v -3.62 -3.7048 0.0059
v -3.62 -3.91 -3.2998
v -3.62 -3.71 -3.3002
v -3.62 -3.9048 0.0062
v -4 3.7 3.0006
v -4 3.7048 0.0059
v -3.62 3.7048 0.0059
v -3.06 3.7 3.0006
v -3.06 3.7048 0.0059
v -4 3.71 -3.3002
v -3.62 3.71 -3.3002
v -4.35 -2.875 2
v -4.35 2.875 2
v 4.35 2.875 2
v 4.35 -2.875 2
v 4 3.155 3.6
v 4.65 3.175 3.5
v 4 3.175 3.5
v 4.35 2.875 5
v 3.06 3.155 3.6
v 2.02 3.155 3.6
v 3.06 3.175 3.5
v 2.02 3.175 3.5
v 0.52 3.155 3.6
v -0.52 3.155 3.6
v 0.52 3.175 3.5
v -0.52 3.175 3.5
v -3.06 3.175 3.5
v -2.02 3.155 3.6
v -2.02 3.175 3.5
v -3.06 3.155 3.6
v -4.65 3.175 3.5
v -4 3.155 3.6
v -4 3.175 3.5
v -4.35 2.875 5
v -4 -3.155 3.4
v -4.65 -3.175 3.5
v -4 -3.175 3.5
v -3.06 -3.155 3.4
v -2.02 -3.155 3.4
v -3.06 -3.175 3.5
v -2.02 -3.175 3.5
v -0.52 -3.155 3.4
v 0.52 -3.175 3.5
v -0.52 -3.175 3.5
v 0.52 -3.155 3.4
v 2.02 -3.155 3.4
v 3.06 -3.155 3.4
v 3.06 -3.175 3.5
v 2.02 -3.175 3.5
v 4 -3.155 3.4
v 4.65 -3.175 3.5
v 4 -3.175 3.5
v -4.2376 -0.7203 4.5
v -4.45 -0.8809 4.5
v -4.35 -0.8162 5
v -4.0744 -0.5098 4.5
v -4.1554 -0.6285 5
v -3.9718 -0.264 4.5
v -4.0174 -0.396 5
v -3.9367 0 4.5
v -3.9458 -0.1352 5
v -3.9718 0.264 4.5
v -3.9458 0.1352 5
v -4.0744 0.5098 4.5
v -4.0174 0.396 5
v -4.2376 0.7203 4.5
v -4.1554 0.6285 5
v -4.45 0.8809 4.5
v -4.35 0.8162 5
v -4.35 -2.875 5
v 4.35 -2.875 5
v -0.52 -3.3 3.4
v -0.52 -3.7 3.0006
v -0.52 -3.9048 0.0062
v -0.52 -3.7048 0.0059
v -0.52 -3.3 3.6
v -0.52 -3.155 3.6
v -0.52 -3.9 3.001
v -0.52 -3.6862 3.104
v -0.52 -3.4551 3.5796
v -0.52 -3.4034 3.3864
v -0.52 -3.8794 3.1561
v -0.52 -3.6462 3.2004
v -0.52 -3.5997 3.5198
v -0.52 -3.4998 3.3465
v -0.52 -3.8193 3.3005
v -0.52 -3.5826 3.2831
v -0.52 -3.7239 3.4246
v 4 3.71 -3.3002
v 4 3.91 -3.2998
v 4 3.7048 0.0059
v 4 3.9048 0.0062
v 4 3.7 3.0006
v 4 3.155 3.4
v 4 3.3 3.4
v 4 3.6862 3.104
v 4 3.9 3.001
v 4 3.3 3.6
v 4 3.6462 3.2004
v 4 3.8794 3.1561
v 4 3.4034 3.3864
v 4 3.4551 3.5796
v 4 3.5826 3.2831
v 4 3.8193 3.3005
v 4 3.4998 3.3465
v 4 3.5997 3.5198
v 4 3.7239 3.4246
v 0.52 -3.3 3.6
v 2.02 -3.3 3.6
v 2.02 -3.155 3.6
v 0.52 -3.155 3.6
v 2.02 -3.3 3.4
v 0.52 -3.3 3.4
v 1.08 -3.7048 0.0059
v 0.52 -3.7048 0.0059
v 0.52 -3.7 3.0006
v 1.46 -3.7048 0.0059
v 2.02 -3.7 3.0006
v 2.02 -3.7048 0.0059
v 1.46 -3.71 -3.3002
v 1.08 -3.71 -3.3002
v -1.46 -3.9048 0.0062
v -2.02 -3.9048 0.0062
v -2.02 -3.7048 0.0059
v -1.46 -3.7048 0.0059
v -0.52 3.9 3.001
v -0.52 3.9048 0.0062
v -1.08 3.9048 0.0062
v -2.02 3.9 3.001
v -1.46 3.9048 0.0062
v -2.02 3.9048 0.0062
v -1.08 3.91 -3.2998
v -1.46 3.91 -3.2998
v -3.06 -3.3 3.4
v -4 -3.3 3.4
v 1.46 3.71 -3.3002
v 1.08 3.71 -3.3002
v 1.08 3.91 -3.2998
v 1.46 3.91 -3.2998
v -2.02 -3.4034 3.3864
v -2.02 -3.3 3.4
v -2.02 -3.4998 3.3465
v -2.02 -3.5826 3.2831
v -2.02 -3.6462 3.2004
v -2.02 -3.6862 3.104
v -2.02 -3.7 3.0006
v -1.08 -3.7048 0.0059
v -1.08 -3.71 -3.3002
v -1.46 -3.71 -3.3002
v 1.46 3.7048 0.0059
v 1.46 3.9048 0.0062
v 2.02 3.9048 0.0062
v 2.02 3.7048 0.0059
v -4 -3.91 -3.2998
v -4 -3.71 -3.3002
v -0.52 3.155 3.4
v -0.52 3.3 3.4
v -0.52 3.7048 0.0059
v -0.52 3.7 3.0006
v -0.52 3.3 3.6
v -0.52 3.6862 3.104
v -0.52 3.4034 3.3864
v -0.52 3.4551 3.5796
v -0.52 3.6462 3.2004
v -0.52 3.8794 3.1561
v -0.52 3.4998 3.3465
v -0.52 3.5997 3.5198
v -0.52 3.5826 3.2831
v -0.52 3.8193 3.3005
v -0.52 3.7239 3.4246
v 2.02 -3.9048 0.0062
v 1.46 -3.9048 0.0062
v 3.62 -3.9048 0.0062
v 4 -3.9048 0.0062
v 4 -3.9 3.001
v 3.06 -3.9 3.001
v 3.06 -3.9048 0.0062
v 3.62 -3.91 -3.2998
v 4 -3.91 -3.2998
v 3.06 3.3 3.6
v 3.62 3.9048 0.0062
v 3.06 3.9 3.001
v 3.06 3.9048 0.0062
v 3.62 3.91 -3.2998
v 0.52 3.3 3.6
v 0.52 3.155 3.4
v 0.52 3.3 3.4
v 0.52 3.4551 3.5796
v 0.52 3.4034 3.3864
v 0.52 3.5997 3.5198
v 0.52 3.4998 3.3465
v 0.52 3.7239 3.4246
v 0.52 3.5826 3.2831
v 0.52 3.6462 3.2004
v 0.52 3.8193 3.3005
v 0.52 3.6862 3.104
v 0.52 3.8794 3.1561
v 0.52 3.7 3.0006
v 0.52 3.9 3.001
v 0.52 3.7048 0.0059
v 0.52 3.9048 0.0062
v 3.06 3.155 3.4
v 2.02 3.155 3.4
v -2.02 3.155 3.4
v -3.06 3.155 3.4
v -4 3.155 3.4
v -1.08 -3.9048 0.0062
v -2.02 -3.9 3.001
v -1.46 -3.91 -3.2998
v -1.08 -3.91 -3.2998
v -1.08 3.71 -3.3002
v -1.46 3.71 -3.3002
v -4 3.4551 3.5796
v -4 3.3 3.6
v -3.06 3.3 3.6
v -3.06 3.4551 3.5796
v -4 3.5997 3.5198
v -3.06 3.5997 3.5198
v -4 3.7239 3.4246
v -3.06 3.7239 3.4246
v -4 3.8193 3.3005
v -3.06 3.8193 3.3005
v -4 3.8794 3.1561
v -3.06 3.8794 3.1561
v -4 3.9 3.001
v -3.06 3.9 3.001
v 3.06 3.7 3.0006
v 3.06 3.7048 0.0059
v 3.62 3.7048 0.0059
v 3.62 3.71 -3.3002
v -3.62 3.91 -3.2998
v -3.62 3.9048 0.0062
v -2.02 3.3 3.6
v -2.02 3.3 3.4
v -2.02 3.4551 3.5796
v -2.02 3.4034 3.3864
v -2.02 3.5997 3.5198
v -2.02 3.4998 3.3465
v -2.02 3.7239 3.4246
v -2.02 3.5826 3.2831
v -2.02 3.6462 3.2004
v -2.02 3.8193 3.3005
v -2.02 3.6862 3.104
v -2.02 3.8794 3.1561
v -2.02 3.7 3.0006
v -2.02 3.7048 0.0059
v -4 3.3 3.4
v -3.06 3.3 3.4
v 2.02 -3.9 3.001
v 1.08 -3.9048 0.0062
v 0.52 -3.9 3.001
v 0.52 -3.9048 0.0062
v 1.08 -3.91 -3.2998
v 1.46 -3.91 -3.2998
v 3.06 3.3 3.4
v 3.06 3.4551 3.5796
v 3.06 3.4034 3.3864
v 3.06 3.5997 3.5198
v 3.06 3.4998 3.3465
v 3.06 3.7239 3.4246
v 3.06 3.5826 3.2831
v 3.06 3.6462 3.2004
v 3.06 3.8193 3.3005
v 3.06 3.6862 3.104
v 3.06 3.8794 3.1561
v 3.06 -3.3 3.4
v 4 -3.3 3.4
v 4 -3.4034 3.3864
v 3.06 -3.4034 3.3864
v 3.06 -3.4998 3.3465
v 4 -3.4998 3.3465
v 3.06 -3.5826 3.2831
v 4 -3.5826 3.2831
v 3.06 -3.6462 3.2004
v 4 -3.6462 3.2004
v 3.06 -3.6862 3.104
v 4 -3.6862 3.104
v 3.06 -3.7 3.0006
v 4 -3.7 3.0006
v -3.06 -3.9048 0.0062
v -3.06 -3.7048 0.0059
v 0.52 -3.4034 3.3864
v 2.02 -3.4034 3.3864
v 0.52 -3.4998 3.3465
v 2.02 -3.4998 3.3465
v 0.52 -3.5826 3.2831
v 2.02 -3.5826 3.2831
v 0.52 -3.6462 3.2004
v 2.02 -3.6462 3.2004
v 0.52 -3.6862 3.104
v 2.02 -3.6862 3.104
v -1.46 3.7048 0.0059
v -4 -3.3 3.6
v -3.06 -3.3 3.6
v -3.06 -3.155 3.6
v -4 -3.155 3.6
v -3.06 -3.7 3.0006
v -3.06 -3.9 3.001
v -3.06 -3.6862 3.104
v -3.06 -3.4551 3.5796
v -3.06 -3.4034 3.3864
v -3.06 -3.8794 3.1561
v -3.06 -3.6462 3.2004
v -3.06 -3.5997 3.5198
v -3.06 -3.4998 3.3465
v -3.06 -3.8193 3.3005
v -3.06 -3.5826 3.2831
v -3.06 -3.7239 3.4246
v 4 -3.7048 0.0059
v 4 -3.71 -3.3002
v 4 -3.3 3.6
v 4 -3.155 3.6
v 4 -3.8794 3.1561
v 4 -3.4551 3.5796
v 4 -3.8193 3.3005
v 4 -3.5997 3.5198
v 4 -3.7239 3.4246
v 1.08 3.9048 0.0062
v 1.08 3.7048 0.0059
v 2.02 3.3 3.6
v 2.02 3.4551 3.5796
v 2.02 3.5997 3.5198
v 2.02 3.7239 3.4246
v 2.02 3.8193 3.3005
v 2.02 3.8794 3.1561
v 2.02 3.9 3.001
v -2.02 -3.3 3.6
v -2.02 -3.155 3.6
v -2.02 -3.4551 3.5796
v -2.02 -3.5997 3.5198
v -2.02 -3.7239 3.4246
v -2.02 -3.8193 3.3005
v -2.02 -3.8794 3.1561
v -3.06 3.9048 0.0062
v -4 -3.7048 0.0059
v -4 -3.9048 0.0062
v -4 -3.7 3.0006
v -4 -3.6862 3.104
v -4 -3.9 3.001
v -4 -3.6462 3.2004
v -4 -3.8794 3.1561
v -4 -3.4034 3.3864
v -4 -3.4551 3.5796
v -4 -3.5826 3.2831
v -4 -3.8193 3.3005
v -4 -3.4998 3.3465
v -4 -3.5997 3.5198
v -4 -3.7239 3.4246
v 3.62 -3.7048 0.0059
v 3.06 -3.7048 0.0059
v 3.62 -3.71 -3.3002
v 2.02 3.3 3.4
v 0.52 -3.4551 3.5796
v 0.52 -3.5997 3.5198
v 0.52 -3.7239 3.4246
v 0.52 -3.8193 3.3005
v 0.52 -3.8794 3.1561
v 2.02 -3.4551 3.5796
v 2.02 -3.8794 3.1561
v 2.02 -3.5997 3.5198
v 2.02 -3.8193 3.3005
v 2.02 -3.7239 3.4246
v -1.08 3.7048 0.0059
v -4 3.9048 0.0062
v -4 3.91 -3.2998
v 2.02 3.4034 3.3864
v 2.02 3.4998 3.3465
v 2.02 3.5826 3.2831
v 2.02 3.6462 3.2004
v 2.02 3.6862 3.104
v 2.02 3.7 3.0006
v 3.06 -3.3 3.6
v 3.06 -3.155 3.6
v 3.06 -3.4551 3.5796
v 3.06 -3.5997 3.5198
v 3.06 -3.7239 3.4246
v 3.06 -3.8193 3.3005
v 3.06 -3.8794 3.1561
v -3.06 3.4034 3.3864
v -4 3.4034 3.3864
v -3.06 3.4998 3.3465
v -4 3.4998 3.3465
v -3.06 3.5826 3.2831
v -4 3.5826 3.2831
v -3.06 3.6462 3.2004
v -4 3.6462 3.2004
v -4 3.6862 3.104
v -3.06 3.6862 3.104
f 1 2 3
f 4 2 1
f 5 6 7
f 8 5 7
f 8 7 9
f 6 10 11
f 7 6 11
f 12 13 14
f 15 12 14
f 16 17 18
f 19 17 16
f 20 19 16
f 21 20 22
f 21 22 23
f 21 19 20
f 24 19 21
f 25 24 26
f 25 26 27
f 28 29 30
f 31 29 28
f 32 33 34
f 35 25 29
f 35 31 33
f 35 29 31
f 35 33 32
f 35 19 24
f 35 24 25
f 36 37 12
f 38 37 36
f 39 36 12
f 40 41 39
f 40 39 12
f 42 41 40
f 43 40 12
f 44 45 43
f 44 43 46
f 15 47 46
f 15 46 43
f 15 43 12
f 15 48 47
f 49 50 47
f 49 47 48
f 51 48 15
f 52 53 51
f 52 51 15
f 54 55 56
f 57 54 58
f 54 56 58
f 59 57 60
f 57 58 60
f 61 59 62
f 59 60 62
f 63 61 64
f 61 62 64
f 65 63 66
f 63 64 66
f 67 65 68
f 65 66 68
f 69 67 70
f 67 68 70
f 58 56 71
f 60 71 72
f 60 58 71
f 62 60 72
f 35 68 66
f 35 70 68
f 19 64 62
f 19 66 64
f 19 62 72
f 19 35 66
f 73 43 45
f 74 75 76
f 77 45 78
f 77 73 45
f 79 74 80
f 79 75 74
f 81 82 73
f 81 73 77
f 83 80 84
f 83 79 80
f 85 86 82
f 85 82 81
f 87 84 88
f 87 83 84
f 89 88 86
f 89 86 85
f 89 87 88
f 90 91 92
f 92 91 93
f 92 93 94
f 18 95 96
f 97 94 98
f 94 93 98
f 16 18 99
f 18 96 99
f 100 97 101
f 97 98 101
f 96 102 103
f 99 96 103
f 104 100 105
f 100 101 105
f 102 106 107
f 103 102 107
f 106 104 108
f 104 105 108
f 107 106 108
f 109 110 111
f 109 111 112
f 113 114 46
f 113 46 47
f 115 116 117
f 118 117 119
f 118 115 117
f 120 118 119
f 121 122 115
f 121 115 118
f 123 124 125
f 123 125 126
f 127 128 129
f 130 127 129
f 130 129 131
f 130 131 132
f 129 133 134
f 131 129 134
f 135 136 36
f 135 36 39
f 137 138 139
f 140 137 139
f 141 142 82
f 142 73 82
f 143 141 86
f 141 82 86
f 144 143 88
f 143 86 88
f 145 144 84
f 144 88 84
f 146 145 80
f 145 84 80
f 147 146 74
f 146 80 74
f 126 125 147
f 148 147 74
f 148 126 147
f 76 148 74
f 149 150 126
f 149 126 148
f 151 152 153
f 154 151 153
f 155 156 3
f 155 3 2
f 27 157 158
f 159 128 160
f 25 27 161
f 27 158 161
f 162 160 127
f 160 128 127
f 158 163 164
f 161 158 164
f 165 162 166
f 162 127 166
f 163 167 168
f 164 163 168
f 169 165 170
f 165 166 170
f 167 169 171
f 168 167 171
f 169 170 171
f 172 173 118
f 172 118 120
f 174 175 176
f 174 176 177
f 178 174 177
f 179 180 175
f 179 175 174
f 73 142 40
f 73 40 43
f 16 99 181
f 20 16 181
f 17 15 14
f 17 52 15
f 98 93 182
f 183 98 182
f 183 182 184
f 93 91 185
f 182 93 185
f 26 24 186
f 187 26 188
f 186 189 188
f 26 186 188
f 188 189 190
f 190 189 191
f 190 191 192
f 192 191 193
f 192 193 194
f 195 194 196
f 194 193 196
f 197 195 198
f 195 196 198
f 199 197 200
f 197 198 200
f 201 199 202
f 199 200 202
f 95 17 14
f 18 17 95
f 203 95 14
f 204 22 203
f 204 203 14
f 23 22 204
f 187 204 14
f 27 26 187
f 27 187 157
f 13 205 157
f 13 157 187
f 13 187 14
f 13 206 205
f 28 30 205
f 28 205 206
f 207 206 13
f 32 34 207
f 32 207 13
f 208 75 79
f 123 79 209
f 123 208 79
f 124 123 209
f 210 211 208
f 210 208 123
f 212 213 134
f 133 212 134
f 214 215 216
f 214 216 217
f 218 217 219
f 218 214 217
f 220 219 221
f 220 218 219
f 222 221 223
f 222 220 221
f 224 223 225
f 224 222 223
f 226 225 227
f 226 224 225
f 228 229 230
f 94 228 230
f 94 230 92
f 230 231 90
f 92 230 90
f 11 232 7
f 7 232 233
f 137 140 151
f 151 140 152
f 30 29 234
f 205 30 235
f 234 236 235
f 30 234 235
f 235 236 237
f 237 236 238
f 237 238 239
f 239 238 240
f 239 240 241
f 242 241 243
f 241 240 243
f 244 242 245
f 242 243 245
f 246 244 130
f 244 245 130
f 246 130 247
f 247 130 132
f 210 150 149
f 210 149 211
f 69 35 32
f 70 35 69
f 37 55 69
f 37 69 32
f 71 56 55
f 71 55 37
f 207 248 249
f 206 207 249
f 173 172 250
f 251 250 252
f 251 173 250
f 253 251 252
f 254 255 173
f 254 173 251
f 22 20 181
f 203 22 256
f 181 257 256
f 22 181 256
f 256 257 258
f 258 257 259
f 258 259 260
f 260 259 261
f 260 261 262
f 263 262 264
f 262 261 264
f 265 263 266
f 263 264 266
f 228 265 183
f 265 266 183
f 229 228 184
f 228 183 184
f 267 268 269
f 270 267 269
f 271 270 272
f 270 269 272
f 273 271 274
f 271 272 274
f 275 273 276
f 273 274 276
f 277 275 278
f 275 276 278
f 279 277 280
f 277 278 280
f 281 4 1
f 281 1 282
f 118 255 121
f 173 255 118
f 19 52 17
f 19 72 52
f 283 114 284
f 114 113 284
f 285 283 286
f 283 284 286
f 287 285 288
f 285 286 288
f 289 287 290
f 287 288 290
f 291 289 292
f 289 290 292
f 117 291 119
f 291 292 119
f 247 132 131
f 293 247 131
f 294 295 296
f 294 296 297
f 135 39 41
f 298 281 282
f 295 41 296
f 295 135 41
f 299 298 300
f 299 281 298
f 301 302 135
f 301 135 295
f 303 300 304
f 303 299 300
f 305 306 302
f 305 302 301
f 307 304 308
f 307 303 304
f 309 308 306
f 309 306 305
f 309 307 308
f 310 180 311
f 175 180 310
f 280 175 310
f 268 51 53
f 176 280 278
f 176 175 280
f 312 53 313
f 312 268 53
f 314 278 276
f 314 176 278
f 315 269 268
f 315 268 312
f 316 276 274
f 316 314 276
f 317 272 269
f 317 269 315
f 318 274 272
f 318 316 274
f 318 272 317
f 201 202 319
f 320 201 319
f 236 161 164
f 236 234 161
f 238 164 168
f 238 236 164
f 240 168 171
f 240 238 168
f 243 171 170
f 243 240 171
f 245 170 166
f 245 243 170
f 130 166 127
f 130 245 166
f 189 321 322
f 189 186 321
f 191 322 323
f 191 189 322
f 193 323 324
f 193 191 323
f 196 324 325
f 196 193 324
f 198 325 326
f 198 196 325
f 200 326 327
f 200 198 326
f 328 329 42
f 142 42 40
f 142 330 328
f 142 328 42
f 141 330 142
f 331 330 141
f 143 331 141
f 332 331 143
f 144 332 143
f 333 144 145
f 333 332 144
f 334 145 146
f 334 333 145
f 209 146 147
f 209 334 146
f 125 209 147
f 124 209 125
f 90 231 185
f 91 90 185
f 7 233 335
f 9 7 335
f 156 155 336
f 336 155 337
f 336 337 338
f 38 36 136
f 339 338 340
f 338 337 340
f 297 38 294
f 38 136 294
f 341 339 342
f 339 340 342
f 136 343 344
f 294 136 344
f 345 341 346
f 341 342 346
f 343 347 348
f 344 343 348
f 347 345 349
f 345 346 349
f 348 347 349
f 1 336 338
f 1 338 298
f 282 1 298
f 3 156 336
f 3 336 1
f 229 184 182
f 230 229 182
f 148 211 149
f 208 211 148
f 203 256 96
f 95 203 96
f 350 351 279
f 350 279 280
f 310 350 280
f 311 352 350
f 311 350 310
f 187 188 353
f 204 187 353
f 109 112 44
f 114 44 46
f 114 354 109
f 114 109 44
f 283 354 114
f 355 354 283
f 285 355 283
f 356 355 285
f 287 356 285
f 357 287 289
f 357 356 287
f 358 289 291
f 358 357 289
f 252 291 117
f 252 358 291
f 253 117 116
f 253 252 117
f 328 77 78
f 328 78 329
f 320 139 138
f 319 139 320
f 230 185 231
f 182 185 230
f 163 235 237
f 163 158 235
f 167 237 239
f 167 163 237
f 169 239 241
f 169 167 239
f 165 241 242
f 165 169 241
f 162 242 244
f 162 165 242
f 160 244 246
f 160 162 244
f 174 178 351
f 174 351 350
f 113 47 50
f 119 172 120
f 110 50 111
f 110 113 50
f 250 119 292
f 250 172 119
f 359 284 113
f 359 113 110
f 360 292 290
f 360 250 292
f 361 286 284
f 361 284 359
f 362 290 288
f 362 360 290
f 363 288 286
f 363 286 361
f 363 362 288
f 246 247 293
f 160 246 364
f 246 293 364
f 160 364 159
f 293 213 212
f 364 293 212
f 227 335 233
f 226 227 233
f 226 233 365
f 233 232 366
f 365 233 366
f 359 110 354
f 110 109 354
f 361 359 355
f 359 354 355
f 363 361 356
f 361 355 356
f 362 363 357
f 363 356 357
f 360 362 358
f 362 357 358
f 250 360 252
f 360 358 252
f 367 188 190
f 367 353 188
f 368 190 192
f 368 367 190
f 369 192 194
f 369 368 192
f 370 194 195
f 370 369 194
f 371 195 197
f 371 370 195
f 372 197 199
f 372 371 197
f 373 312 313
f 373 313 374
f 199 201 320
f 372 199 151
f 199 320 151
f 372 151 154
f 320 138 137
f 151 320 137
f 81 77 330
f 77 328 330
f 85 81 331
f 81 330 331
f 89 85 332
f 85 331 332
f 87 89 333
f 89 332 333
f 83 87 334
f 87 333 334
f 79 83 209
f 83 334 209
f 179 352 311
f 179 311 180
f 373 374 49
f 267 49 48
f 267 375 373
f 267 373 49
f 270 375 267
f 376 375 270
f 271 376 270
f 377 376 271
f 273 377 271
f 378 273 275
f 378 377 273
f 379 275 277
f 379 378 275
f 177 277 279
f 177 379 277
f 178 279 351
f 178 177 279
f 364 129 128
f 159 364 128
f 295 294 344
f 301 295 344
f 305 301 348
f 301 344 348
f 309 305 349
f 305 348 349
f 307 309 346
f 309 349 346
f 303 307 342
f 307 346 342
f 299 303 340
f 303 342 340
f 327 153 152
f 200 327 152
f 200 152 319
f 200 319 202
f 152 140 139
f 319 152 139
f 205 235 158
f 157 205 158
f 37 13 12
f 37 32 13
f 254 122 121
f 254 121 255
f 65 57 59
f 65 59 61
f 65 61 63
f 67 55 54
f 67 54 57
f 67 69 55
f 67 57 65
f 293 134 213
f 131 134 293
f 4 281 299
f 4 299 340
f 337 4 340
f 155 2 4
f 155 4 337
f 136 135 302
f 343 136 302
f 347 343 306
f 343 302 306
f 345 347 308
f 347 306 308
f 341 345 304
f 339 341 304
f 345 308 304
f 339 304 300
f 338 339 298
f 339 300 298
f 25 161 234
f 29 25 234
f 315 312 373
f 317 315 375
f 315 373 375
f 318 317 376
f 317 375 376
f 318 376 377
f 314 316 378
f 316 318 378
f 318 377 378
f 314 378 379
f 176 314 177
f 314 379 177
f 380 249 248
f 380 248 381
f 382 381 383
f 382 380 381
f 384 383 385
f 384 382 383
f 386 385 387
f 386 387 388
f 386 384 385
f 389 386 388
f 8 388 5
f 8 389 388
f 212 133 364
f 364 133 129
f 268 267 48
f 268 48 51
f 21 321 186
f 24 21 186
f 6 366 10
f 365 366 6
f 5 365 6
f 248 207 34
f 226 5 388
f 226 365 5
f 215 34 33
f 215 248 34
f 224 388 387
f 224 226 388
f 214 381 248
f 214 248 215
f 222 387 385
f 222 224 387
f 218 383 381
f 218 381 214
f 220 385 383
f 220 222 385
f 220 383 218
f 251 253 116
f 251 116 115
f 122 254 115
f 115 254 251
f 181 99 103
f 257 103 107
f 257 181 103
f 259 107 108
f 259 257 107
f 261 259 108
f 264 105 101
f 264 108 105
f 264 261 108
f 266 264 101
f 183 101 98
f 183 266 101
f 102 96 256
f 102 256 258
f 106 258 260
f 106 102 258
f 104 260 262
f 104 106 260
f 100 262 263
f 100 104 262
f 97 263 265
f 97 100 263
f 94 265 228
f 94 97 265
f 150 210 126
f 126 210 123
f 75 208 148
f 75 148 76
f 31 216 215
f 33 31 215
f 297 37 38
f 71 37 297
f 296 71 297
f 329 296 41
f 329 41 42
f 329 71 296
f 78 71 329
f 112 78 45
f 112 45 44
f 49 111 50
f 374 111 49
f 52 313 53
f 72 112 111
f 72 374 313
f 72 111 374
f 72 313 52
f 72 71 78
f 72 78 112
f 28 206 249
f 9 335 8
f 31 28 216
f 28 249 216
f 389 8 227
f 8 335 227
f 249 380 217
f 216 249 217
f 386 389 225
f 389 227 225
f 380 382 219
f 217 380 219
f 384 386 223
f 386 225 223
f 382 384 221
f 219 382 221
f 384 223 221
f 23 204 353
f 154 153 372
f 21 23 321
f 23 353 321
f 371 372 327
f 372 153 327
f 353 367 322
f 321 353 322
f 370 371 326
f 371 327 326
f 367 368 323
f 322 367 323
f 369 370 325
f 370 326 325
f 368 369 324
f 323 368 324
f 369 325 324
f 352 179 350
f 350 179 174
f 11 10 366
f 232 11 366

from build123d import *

# Parameters (mm, degrees)
F4_W      = 8.7
F4_H      = 5.75
F3_W      = 9.3
F3_H      = 6.35
F5_W      = 8.7
F5_H      = 5.75
F9_DEPTH  = 0.5
F12_W     = 1.5
F12_H     = 0.2
F14_W     = 0.6195948031
F14_H     = 4.0430515073
F15_DEPTH = 25
F20_W     = 1.304730963
F20_H     = 4.4884709641
F21_DEPTH = 25
F22_W     = 1.5146217346
F22_H     = 4.5125598554
F23_DEPTH = 25


with BuildPart() as f6:
    # F4 (on offset) → F6 section 0
    with BuildSketch(Plane.XY.offset(2)):
        Rectangle(F4_W, F4_H)
    # F3 (on offset) → F6 section 1
    with BuildSketch(Plane.XY.offset(3.5)):
        Rectangle(F3_W, F3_H)
    loft()

    # F3 (on offset) → F7 section 0
    with BuildSketch(Plane.XY.offset(3.5)):
        Rectangle(F3_W, F3_H)
    # F5 (on offset) → F7 section 1
    with BuildSketch(Plane.XY.offset(5)):
        Rectangle(F5_W, F5_H)
    loft()

    # F8 (on face) → F9 (cut)
    with BuildSketch(Plane.XY.offset(5)):
        with BuildLine():
            Line((-4.5071290817, 0.9109661553), (-4.5071290817, -0.9109661553))
            ThreePointArc((-4.5071290817, -0.9109661553), (-3.936739006, 0), (-4.5071290817, 0.9109661553))
        make_face()
    extrude(amount=-F9_DEPTH, mode=Mode.SUBTRACT)



with BuildPart() as f13:
    # F13: sweep along a path in F10
    with BuildLine(Plane.YZ) as f13_path:
        Line((-2.0310959943, 3.5), (-3.3000006297, 3.5))
        ThreePointArc((-3.3000006297, 3.5), (-3.6532733467, 3.3538338416), (-3.8, 3.0007935498))
        Line((-3.8, 3.0007935498), (-3.81, -3.3))
    # F12 (on line) → F13 (sweep)
    with BuildSketch(Plane(origin=(0, -0.0052470193, -3.3060385298), x_dir=(1, 0, 0), z_dir=(0, -0.0015870997, -0.9999987406))):
        with Locations((0, 3.8047577726)):
            Rectangle(F12_W, F12_H)
    sweep(path=f13_path.line)

    # F14 (on face) → F15 (cut)
    with BuildSketch(Plane(origin=(0, -3.9047528548, 0.0061972398), x_dir=(1, 0, 0), z_dir=(0, -0.9999987406, 0.0015870997))):
        with Locations((-0.4997974016, -2.0215257537)):
            Rectangle(F14_W, F14_H)
        with Locations((0.4997974016, -2.0215257537)):
            Rectangle(F14_W, F14_H)
    extrude(amount=-F15_DEPTH, mode=Mode.SUBTRACT)


with BuildPart() as f13_1:
    # F16: moved
    add(f13.part.moved(Location((-1.27, 0, 0))))


with BuildPart() as f17_1:
    # F17: copy of F13
    add(f13_1.part.moved(Location((2.54, 0, 0))))


with BuildPart() as f18_1:
    # F18: copy of F13
    add(f13_1.part.moved(Location((-2.54, 0, 0))))

    # F20 (on face) → F21 (cut)
    with BuildSketch(Plane(origin=(0, -3.9047528548, 0.0061972398), x_dir=(1, 0, 0), z_dir=(0, -0.9999987406, 0.0015870997))):
        with Locations((-4.6523654815, 1.4981951099)):
            Rectangle(F20_W, F20_H)
    extrude(amount=-F21_DEPTH, mode=Mode.SUBTRACT)


with BuildPart() as f19_1:
    # F19: copy of F17_1
    add(f17_1.part.moved(Location((2.54, 0, 0))))

    # F22 (on face) → F23 (cut)
    with BuildSketch(Plane(origin=(0, -3.9047528548, 0.0061972398), x_dir=(1, 0, 0), z_dir=(0, -0.9999987406, 0.0015870997))):
        with Locations((4.7573108673, 1.4692934928)):
            Rectangle(F22_W, F22_H)
    extrude(amount=-F23_DEPTH, mode=Mode.SUBTRACT)


with BuildPart() as f6_1:
    add(f6.part)

    add(f13_1.part)  # F24 merges F13

    add(f17_1.part)  # F24 merges F17_1

    add(f18_1.part)  # F24 merges F18_1

    add(f19_1.part)  # F24 merges F19_1
    # F24: F18_1, F13, F17_1, F19_1 across plane
    add(f18_1.part.mirror(Plane.XZ))
    add(f13_1.part.mirror(Plane.XZ))
    add(f17_1.part.mirror(Plane.XZ))
    add(f19_1.part.mirror(Plane.XZ))


solid = f6_1.part
